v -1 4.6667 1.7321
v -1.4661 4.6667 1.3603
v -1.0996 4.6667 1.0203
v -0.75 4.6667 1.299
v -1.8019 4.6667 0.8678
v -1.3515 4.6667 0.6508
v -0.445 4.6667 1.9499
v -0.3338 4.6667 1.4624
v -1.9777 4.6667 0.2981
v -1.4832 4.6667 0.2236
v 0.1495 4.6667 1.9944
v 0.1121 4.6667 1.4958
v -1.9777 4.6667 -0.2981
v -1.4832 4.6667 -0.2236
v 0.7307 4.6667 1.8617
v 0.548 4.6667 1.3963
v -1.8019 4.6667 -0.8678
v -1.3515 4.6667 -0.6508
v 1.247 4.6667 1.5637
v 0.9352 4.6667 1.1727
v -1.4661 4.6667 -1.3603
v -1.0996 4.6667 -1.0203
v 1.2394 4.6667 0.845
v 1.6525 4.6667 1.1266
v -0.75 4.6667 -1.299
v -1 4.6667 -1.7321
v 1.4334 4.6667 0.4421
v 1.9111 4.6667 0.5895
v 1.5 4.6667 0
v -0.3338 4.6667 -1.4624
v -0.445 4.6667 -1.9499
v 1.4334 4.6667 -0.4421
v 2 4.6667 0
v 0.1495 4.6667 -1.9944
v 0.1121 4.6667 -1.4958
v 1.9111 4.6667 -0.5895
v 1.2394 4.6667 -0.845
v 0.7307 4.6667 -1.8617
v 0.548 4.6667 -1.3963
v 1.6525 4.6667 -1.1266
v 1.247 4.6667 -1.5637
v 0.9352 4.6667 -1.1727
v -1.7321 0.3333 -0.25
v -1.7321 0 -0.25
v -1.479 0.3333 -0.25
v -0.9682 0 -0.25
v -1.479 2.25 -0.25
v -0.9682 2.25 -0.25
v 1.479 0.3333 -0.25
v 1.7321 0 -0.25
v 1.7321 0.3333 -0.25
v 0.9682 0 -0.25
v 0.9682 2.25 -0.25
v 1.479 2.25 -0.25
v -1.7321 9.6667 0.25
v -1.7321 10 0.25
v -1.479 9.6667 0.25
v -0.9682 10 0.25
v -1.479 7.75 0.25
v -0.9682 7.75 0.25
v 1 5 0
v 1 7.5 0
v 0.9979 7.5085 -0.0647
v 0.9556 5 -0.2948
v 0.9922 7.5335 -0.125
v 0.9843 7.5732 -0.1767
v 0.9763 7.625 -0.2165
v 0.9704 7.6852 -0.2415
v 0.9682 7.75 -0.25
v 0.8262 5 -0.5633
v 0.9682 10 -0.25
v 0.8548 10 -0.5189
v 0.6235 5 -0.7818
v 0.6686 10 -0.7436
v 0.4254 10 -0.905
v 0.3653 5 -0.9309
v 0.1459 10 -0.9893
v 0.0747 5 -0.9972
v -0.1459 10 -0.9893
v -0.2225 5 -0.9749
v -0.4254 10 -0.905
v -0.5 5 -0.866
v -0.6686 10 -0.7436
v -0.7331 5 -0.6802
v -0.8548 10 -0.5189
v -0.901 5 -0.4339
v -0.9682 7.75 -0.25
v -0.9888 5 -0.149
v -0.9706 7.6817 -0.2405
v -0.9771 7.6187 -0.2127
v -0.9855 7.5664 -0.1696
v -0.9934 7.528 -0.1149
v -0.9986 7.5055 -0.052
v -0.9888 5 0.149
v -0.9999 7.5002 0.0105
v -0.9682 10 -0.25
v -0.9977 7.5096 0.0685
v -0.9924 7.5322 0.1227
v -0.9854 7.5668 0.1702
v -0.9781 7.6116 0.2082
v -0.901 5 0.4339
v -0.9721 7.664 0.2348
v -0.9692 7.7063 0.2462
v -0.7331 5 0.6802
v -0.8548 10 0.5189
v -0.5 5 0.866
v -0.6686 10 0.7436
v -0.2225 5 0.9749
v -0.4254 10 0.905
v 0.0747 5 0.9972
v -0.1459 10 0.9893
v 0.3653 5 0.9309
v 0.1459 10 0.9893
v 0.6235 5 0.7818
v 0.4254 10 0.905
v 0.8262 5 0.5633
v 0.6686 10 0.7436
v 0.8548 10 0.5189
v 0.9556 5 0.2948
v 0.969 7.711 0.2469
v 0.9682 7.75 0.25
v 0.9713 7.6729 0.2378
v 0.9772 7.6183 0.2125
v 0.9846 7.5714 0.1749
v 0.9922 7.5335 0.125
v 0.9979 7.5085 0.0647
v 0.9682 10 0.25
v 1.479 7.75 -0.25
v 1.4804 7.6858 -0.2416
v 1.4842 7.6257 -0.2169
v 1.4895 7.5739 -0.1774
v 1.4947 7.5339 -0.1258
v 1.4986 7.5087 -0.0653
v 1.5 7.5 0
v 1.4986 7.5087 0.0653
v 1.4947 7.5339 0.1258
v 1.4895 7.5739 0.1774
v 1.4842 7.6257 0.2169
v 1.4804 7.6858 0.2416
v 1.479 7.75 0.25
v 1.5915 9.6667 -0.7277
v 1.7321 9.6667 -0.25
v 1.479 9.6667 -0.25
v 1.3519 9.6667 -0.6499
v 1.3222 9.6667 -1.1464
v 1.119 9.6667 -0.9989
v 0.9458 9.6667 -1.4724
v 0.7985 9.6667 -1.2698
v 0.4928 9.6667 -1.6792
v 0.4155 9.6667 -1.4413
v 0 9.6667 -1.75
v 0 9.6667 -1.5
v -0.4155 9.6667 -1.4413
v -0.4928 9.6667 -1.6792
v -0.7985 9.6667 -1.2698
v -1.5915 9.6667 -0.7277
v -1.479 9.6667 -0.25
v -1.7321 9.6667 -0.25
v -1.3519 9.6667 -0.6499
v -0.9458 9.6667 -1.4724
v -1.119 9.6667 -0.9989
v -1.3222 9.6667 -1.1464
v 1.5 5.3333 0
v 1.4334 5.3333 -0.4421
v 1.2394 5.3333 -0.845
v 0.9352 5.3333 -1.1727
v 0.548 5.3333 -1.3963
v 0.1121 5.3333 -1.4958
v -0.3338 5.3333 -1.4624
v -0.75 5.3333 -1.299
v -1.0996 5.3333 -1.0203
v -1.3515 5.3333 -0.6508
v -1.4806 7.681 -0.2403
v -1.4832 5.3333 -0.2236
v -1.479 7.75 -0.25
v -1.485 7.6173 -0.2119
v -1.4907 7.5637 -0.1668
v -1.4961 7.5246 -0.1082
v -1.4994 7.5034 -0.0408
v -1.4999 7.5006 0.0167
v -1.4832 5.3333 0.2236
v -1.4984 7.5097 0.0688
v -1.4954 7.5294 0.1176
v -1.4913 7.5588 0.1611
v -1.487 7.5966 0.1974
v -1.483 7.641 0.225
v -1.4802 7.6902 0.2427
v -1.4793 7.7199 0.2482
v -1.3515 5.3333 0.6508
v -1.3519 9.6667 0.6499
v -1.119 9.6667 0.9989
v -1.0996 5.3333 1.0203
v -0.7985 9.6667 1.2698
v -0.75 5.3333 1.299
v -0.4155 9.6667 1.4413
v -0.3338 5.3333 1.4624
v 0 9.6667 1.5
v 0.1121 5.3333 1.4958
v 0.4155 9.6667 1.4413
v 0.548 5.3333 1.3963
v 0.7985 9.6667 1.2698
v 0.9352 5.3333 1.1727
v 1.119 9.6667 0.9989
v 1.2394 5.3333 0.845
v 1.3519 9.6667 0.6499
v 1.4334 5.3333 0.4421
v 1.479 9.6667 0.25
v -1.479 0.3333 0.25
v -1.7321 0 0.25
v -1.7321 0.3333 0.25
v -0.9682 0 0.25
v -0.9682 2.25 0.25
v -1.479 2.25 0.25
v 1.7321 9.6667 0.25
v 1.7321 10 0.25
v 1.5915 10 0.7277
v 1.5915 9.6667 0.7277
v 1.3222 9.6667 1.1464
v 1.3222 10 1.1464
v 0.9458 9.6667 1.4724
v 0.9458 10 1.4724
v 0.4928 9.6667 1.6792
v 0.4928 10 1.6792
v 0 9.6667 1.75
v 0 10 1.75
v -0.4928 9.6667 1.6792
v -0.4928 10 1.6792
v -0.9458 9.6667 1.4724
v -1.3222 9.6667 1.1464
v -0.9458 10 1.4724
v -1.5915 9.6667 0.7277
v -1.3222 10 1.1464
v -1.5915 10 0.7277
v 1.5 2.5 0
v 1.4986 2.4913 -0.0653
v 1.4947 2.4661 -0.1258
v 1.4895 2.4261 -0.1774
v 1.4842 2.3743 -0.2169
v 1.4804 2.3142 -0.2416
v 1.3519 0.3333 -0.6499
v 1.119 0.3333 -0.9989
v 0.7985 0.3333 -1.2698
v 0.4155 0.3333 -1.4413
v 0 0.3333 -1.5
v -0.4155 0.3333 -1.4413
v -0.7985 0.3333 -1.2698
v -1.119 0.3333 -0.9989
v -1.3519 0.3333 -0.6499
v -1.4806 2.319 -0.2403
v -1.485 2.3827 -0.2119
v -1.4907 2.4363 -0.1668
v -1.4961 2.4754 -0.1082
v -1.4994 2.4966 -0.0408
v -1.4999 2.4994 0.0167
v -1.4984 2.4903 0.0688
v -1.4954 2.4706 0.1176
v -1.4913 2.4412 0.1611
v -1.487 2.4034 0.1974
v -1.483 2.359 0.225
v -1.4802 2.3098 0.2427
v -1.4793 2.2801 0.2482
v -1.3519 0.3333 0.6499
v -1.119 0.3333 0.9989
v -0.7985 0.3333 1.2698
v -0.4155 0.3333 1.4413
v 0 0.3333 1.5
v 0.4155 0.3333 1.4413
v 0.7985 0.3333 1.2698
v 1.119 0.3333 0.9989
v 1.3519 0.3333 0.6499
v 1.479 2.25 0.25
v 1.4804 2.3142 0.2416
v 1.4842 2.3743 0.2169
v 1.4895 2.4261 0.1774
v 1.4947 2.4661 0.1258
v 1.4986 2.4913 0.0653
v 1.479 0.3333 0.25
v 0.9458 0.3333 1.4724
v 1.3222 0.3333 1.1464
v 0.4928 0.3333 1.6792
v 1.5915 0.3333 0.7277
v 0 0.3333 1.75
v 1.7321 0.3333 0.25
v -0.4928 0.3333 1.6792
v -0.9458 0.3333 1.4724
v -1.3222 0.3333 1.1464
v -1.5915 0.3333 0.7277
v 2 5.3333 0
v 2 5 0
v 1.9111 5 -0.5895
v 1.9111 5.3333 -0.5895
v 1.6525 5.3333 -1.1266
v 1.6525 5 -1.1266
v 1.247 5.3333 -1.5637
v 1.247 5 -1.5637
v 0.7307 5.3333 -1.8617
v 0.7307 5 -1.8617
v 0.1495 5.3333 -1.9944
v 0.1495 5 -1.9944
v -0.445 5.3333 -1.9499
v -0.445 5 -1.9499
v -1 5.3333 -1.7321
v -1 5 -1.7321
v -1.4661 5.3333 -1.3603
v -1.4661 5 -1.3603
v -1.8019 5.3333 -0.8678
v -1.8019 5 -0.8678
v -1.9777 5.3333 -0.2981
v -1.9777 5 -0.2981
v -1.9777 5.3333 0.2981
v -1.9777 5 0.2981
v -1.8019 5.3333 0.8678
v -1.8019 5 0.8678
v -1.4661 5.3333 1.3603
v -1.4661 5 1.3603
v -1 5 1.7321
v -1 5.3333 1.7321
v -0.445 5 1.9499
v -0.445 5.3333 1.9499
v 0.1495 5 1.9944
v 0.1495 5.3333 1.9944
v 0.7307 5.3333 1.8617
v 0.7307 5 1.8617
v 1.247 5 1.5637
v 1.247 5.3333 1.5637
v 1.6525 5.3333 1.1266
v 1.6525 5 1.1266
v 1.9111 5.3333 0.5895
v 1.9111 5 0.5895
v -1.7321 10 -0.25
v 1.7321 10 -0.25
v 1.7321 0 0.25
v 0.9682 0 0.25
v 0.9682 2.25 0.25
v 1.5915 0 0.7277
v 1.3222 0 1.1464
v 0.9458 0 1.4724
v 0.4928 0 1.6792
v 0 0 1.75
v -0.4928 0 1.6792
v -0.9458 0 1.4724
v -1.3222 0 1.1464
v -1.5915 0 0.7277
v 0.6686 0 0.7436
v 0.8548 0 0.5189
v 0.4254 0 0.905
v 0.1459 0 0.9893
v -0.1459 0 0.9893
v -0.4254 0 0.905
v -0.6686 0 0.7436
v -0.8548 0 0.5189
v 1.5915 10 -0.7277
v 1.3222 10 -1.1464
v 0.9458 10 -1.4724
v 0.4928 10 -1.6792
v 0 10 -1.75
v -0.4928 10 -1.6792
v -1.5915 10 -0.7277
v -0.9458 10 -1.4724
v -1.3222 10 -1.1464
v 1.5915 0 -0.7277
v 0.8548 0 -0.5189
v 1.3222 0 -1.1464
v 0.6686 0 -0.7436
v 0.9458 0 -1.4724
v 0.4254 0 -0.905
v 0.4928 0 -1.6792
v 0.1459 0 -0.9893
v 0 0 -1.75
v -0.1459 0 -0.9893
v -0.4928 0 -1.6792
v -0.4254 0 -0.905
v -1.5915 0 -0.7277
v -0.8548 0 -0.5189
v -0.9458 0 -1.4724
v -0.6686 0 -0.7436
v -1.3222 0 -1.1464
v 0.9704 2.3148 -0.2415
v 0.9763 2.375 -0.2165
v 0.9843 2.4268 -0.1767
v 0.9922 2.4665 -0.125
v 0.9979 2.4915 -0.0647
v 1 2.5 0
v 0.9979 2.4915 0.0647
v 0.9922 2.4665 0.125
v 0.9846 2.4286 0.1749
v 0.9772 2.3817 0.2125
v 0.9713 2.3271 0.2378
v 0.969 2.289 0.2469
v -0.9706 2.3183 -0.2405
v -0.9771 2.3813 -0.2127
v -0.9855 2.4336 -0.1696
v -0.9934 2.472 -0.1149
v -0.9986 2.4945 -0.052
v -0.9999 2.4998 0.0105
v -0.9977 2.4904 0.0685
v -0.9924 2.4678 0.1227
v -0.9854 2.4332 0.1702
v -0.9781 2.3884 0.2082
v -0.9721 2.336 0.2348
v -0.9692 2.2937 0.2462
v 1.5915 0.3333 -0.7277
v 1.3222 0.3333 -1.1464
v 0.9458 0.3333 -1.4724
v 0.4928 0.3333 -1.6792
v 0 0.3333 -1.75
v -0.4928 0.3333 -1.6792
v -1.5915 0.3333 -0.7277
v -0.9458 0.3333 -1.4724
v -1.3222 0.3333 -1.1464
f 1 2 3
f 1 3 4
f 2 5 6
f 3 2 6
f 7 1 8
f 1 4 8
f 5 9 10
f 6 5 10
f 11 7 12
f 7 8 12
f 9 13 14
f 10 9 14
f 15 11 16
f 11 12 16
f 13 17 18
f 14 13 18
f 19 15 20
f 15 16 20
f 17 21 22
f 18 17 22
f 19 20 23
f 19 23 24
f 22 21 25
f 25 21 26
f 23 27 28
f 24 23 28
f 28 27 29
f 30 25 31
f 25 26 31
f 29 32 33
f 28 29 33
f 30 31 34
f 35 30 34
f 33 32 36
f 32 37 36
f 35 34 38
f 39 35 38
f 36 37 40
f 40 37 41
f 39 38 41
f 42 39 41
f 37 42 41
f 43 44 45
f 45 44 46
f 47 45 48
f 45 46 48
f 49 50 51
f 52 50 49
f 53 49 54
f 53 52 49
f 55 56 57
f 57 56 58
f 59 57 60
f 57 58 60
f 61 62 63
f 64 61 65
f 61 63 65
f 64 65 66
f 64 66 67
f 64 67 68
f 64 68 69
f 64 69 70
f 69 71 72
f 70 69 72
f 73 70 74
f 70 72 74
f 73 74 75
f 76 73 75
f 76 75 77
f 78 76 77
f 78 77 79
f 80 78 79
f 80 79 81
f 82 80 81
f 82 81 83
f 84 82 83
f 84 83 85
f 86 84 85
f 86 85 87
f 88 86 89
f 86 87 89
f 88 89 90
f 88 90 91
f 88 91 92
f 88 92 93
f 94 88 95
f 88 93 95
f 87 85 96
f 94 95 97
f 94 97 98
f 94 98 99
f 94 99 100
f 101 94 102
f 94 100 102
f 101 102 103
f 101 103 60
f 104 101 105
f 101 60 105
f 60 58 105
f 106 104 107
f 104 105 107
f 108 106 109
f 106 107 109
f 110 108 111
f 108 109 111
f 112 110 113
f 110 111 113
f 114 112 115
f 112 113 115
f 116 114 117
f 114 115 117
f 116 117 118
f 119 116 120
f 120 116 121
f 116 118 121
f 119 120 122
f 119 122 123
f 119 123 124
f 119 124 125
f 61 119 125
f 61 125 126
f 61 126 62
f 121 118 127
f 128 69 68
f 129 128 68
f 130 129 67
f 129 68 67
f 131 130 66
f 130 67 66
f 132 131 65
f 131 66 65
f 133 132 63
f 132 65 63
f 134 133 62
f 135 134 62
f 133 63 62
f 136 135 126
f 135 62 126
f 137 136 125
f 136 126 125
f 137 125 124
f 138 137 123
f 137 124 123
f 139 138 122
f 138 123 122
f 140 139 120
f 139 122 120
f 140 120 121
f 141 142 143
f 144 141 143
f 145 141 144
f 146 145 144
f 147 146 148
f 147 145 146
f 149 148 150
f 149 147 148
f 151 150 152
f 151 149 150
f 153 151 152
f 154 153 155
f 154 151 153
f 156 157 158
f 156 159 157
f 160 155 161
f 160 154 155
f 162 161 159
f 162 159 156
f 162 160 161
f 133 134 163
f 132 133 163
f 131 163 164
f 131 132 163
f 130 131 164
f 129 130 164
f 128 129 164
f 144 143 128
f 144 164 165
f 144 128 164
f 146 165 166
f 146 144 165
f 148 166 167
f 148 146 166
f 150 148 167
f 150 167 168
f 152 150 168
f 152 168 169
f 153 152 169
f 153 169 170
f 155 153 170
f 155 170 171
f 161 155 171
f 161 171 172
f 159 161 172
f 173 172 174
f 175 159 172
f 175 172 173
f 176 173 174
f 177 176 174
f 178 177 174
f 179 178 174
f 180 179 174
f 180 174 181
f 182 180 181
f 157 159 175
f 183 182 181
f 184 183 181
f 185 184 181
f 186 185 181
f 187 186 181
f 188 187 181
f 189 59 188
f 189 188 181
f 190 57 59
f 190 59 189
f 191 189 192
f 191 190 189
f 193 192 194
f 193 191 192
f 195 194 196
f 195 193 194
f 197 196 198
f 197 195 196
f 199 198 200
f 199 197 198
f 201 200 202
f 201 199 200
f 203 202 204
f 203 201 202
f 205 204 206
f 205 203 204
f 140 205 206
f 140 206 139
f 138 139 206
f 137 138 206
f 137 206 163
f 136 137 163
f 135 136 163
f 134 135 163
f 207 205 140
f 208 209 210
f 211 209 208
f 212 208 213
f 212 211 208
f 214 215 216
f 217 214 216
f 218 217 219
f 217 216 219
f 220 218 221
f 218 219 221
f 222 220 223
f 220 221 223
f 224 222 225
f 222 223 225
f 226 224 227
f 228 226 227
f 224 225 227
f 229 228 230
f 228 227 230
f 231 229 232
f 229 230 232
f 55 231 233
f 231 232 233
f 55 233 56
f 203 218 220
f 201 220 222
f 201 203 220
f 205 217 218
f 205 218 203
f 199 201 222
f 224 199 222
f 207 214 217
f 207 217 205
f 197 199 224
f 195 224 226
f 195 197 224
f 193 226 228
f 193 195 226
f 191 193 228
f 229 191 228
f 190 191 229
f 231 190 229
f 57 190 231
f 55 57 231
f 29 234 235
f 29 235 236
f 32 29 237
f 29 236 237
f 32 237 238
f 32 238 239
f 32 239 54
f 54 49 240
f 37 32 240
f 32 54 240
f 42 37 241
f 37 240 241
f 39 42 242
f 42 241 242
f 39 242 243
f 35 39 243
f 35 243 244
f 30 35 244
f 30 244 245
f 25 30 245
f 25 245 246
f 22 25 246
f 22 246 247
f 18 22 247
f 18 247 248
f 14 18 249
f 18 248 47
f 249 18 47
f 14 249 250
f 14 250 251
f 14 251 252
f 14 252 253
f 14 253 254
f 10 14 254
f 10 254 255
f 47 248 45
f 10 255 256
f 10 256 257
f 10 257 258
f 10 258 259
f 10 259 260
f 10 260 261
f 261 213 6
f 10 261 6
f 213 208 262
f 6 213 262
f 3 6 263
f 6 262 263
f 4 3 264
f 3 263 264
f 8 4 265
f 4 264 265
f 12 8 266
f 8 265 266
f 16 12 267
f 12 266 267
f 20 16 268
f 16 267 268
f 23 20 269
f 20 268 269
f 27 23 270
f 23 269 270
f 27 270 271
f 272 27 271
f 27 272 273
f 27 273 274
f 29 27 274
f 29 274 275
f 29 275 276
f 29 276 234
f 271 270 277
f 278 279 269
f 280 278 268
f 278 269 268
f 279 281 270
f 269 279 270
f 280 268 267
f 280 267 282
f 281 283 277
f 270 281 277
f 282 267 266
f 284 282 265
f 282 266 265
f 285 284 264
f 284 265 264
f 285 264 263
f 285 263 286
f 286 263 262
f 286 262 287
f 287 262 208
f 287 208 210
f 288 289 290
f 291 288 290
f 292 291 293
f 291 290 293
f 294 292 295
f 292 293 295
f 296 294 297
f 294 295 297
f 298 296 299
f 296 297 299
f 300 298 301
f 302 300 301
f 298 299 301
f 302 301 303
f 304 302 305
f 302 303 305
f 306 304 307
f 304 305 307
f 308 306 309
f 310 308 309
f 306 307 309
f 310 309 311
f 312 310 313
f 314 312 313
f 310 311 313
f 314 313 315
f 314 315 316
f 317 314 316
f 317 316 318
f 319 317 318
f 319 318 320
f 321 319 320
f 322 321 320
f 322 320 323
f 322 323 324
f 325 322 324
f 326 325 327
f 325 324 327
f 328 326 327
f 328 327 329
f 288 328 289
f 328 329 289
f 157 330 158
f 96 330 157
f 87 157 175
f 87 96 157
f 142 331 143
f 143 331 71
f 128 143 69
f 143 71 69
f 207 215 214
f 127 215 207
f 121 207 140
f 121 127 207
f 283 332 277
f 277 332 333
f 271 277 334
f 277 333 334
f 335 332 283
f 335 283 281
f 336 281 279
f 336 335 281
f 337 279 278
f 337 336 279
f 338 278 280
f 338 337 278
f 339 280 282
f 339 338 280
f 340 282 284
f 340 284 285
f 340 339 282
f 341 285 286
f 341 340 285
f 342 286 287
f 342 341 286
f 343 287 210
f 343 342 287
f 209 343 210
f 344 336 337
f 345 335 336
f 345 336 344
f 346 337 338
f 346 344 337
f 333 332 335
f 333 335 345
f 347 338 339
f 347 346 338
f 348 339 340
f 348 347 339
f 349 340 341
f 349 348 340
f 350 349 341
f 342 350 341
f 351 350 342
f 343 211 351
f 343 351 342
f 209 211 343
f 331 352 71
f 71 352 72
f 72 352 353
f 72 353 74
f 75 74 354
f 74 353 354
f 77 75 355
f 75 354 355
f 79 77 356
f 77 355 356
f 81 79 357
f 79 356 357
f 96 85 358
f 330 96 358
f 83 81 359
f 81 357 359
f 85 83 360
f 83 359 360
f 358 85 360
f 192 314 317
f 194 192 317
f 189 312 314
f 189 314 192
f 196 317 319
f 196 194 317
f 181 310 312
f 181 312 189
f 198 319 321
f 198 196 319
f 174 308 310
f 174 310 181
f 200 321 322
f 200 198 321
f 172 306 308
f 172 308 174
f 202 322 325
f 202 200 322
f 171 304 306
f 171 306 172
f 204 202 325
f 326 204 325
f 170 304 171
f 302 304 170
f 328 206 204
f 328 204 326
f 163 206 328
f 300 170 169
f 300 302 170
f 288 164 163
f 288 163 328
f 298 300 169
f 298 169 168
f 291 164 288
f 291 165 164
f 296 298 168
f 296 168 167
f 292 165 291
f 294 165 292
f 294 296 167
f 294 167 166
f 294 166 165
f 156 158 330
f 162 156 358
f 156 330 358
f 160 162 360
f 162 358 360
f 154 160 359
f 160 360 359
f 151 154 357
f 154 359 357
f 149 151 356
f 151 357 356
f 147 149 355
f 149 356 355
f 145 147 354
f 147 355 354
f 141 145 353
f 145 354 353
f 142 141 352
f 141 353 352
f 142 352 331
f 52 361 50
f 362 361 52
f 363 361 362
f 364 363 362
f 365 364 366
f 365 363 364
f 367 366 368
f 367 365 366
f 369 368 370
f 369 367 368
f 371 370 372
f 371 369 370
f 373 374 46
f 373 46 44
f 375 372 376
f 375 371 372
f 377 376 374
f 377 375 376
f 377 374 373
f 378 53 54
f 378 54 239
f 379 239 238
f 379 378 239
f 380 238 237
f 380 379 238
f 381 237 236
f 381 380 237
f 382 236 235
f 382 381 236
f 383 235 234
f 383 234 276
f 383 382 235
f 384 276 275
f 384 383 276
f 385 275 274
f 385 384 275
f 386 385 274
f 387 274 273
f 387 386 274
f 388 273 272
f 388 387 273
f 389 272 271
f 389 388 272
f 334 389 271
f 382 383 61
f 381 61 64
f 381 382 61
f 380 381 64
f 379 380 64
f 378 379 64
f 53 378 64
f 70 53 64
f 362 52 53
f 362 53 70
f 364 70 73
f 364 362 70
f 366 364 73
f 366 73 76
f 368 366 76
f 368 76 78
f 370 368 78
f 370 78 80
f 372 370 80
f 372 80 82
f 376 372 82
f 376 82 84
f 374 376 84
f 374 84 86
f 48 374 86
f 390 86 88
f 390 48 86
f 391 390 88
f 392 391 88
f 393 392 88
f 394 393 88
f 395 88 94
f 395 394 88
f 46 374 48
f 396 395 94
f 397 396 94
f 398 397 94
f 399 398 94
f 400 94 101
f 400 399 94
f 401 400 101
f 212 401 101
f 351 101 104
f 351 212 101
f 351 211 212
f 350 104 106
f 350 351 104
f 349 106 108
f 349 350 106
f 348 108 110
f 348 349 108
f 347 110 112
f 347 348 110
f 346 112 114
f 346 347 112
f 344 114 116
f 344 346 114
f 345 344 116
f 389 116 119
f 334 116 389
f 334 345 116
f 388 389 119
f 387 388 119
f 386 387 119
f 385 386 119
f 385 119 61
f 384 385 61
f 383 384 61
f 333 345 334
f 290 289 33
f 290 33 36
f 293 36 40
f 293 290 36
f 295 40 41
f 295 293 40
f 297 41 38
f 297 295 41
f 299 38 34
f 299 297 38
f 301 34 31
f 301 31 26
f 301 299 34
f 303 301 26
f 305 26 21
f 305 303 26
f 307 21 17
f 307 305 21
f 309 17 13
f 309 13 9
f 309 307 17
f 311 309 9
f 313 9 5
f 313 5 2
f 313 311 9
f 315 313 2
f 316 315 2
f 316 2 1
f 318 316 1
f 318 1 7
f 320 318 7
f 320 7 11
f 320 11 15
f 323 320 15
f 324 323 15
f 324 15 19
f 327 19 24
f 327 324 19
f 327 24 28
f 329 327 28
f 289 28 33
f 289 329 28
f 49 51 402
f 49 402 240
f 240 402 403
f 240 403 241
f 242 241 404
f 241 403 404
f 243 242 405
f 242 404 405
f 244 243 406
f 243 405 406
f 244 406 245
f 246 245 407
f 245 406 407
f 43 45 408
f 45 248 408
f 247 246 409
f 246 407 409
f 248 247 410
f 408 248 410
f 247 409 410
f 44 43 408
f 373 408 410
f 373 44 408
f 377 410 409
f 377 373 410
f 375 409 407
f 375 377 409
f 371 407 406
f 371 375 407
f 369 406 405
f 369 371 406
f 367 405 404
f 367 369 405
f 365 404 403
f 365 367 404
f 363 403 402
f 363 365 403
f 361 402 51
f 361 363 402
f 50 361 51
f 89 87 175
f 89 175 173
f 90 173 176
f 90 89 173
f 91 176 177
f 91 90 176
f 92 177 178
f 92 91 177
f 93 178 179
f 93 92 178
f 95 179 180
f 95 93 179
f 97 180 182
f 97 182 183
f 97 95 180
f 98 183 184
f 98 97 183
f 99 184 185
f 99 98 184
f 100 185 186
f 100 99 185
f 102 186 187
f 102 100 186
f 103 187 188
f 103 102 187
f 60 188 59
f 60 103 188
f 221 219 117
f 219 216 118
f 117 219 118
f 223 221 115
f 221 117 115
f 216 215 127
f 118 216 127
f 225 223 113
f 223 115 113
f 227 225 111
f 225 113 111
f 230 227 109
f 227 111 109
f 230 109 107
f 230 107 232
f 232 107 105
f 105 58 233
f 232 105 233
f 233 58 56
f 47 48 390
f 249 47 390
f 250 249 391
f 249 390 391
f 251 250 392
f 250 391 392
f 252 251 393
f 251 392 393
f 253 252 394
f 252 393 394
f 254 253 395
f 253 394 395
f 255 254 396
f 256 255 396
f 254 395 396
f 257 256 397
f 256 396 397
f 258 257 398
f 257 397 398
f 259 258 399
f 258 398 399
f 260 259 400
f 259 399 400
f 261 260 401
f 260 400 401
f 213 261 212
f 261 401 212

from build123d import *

# Parameters (mm, degrees)
SKETCH1_R               = 1.5
SKETCH1_R_2             = 1
BOSS_EXTRUDE1_DEPTH     = 5
SKETCH2_R               = 2
SKETCH2_R_2             = 1
BOSS_EXTRUDE2_DEPTH     = 0.333333333
SKETCH3_R               = 1.75
SKETCH3_R_2             = 1
BOSS_EXTRUDE4_DEPTH     = 0.333333333
SKETCH4_R               = 0.25
SKETCH4_W               = 0.5
SKETCH4_H               = 2.25
CUT_EXTRUDE1_DEPTH      = 3
CUT_EXTRUDE1_DEPTH_BACK = 3


with BuildPart() as part:
    # Sketch1 → Boss-Extrude1 (new body)
    with BuildSketch(Plane(origin=(0, 0, 0), x_dir=(1, 0, 0), z_dir=(0, 1, 0))):
        Circle(SKETCH1_R)
        Circle(SKETCH1_R_2, mode=Mode.SUBTRACT)
    extrude(amount=BOSS_EXTRUDE1_DEPTH)

    # Sketch2 → Boss-Extrude2 (add)
    with BuildSketch(Plane(origin=(0, 5, 0), x_dir=(1, 0, 0), z_dir=(0, 1, 0))):
        Circle(SKETCH2_R)
        Circle(SKETCH2_R_2, mode=Mode.SUBTRACT)
    extrude(amount=-BOSS_EXTRUDE2_DEPTH)

    # Sketch3 → Boss-Extrude4 (add)
    with BuildSketch(Plane(origin=(0, 0, 0), x_dir=(-1, 0, 0), z_dir=(0, -1, 0))):
        Circle(SKETCH3_R)
        Circle(SKETCH3_R_2, mode=Mode.SUBTRACT)
    extrude(amount=-BOSS_EXTRUDE4_DEPTH)

    # Sketch4 → Cut-Extrude1 (cut, two sides)
    with BuildSketch(Plane(origin=(0, 0, 0), x_dir=(0, 0, -1), z_dir=(1, 0, 0))) as cut_extrude1_sk:
        with Locations((0, 2.25)):
            Circle(SKETCH4_R)
        with Locations((0, 1.125)):
            Rectangle(SKETCH4_W, SKETCH4_H)
    extrude(amount=CUT_EXTRUDE1_DEPTH, mode=Mode.SUBTRACT)
    extrude(cut_extrude1_sk.sketch, amount=-CUT_EXTRUDE1_DEPTH_BACK, mode=Mode.SUBTRACT)

    # Mirror1: part across plane


with BuildPart() as part_1:
    add(part.part)
    add(part.part.mirror(Plane.ZX.offset(5)))


solid = part_1.part
